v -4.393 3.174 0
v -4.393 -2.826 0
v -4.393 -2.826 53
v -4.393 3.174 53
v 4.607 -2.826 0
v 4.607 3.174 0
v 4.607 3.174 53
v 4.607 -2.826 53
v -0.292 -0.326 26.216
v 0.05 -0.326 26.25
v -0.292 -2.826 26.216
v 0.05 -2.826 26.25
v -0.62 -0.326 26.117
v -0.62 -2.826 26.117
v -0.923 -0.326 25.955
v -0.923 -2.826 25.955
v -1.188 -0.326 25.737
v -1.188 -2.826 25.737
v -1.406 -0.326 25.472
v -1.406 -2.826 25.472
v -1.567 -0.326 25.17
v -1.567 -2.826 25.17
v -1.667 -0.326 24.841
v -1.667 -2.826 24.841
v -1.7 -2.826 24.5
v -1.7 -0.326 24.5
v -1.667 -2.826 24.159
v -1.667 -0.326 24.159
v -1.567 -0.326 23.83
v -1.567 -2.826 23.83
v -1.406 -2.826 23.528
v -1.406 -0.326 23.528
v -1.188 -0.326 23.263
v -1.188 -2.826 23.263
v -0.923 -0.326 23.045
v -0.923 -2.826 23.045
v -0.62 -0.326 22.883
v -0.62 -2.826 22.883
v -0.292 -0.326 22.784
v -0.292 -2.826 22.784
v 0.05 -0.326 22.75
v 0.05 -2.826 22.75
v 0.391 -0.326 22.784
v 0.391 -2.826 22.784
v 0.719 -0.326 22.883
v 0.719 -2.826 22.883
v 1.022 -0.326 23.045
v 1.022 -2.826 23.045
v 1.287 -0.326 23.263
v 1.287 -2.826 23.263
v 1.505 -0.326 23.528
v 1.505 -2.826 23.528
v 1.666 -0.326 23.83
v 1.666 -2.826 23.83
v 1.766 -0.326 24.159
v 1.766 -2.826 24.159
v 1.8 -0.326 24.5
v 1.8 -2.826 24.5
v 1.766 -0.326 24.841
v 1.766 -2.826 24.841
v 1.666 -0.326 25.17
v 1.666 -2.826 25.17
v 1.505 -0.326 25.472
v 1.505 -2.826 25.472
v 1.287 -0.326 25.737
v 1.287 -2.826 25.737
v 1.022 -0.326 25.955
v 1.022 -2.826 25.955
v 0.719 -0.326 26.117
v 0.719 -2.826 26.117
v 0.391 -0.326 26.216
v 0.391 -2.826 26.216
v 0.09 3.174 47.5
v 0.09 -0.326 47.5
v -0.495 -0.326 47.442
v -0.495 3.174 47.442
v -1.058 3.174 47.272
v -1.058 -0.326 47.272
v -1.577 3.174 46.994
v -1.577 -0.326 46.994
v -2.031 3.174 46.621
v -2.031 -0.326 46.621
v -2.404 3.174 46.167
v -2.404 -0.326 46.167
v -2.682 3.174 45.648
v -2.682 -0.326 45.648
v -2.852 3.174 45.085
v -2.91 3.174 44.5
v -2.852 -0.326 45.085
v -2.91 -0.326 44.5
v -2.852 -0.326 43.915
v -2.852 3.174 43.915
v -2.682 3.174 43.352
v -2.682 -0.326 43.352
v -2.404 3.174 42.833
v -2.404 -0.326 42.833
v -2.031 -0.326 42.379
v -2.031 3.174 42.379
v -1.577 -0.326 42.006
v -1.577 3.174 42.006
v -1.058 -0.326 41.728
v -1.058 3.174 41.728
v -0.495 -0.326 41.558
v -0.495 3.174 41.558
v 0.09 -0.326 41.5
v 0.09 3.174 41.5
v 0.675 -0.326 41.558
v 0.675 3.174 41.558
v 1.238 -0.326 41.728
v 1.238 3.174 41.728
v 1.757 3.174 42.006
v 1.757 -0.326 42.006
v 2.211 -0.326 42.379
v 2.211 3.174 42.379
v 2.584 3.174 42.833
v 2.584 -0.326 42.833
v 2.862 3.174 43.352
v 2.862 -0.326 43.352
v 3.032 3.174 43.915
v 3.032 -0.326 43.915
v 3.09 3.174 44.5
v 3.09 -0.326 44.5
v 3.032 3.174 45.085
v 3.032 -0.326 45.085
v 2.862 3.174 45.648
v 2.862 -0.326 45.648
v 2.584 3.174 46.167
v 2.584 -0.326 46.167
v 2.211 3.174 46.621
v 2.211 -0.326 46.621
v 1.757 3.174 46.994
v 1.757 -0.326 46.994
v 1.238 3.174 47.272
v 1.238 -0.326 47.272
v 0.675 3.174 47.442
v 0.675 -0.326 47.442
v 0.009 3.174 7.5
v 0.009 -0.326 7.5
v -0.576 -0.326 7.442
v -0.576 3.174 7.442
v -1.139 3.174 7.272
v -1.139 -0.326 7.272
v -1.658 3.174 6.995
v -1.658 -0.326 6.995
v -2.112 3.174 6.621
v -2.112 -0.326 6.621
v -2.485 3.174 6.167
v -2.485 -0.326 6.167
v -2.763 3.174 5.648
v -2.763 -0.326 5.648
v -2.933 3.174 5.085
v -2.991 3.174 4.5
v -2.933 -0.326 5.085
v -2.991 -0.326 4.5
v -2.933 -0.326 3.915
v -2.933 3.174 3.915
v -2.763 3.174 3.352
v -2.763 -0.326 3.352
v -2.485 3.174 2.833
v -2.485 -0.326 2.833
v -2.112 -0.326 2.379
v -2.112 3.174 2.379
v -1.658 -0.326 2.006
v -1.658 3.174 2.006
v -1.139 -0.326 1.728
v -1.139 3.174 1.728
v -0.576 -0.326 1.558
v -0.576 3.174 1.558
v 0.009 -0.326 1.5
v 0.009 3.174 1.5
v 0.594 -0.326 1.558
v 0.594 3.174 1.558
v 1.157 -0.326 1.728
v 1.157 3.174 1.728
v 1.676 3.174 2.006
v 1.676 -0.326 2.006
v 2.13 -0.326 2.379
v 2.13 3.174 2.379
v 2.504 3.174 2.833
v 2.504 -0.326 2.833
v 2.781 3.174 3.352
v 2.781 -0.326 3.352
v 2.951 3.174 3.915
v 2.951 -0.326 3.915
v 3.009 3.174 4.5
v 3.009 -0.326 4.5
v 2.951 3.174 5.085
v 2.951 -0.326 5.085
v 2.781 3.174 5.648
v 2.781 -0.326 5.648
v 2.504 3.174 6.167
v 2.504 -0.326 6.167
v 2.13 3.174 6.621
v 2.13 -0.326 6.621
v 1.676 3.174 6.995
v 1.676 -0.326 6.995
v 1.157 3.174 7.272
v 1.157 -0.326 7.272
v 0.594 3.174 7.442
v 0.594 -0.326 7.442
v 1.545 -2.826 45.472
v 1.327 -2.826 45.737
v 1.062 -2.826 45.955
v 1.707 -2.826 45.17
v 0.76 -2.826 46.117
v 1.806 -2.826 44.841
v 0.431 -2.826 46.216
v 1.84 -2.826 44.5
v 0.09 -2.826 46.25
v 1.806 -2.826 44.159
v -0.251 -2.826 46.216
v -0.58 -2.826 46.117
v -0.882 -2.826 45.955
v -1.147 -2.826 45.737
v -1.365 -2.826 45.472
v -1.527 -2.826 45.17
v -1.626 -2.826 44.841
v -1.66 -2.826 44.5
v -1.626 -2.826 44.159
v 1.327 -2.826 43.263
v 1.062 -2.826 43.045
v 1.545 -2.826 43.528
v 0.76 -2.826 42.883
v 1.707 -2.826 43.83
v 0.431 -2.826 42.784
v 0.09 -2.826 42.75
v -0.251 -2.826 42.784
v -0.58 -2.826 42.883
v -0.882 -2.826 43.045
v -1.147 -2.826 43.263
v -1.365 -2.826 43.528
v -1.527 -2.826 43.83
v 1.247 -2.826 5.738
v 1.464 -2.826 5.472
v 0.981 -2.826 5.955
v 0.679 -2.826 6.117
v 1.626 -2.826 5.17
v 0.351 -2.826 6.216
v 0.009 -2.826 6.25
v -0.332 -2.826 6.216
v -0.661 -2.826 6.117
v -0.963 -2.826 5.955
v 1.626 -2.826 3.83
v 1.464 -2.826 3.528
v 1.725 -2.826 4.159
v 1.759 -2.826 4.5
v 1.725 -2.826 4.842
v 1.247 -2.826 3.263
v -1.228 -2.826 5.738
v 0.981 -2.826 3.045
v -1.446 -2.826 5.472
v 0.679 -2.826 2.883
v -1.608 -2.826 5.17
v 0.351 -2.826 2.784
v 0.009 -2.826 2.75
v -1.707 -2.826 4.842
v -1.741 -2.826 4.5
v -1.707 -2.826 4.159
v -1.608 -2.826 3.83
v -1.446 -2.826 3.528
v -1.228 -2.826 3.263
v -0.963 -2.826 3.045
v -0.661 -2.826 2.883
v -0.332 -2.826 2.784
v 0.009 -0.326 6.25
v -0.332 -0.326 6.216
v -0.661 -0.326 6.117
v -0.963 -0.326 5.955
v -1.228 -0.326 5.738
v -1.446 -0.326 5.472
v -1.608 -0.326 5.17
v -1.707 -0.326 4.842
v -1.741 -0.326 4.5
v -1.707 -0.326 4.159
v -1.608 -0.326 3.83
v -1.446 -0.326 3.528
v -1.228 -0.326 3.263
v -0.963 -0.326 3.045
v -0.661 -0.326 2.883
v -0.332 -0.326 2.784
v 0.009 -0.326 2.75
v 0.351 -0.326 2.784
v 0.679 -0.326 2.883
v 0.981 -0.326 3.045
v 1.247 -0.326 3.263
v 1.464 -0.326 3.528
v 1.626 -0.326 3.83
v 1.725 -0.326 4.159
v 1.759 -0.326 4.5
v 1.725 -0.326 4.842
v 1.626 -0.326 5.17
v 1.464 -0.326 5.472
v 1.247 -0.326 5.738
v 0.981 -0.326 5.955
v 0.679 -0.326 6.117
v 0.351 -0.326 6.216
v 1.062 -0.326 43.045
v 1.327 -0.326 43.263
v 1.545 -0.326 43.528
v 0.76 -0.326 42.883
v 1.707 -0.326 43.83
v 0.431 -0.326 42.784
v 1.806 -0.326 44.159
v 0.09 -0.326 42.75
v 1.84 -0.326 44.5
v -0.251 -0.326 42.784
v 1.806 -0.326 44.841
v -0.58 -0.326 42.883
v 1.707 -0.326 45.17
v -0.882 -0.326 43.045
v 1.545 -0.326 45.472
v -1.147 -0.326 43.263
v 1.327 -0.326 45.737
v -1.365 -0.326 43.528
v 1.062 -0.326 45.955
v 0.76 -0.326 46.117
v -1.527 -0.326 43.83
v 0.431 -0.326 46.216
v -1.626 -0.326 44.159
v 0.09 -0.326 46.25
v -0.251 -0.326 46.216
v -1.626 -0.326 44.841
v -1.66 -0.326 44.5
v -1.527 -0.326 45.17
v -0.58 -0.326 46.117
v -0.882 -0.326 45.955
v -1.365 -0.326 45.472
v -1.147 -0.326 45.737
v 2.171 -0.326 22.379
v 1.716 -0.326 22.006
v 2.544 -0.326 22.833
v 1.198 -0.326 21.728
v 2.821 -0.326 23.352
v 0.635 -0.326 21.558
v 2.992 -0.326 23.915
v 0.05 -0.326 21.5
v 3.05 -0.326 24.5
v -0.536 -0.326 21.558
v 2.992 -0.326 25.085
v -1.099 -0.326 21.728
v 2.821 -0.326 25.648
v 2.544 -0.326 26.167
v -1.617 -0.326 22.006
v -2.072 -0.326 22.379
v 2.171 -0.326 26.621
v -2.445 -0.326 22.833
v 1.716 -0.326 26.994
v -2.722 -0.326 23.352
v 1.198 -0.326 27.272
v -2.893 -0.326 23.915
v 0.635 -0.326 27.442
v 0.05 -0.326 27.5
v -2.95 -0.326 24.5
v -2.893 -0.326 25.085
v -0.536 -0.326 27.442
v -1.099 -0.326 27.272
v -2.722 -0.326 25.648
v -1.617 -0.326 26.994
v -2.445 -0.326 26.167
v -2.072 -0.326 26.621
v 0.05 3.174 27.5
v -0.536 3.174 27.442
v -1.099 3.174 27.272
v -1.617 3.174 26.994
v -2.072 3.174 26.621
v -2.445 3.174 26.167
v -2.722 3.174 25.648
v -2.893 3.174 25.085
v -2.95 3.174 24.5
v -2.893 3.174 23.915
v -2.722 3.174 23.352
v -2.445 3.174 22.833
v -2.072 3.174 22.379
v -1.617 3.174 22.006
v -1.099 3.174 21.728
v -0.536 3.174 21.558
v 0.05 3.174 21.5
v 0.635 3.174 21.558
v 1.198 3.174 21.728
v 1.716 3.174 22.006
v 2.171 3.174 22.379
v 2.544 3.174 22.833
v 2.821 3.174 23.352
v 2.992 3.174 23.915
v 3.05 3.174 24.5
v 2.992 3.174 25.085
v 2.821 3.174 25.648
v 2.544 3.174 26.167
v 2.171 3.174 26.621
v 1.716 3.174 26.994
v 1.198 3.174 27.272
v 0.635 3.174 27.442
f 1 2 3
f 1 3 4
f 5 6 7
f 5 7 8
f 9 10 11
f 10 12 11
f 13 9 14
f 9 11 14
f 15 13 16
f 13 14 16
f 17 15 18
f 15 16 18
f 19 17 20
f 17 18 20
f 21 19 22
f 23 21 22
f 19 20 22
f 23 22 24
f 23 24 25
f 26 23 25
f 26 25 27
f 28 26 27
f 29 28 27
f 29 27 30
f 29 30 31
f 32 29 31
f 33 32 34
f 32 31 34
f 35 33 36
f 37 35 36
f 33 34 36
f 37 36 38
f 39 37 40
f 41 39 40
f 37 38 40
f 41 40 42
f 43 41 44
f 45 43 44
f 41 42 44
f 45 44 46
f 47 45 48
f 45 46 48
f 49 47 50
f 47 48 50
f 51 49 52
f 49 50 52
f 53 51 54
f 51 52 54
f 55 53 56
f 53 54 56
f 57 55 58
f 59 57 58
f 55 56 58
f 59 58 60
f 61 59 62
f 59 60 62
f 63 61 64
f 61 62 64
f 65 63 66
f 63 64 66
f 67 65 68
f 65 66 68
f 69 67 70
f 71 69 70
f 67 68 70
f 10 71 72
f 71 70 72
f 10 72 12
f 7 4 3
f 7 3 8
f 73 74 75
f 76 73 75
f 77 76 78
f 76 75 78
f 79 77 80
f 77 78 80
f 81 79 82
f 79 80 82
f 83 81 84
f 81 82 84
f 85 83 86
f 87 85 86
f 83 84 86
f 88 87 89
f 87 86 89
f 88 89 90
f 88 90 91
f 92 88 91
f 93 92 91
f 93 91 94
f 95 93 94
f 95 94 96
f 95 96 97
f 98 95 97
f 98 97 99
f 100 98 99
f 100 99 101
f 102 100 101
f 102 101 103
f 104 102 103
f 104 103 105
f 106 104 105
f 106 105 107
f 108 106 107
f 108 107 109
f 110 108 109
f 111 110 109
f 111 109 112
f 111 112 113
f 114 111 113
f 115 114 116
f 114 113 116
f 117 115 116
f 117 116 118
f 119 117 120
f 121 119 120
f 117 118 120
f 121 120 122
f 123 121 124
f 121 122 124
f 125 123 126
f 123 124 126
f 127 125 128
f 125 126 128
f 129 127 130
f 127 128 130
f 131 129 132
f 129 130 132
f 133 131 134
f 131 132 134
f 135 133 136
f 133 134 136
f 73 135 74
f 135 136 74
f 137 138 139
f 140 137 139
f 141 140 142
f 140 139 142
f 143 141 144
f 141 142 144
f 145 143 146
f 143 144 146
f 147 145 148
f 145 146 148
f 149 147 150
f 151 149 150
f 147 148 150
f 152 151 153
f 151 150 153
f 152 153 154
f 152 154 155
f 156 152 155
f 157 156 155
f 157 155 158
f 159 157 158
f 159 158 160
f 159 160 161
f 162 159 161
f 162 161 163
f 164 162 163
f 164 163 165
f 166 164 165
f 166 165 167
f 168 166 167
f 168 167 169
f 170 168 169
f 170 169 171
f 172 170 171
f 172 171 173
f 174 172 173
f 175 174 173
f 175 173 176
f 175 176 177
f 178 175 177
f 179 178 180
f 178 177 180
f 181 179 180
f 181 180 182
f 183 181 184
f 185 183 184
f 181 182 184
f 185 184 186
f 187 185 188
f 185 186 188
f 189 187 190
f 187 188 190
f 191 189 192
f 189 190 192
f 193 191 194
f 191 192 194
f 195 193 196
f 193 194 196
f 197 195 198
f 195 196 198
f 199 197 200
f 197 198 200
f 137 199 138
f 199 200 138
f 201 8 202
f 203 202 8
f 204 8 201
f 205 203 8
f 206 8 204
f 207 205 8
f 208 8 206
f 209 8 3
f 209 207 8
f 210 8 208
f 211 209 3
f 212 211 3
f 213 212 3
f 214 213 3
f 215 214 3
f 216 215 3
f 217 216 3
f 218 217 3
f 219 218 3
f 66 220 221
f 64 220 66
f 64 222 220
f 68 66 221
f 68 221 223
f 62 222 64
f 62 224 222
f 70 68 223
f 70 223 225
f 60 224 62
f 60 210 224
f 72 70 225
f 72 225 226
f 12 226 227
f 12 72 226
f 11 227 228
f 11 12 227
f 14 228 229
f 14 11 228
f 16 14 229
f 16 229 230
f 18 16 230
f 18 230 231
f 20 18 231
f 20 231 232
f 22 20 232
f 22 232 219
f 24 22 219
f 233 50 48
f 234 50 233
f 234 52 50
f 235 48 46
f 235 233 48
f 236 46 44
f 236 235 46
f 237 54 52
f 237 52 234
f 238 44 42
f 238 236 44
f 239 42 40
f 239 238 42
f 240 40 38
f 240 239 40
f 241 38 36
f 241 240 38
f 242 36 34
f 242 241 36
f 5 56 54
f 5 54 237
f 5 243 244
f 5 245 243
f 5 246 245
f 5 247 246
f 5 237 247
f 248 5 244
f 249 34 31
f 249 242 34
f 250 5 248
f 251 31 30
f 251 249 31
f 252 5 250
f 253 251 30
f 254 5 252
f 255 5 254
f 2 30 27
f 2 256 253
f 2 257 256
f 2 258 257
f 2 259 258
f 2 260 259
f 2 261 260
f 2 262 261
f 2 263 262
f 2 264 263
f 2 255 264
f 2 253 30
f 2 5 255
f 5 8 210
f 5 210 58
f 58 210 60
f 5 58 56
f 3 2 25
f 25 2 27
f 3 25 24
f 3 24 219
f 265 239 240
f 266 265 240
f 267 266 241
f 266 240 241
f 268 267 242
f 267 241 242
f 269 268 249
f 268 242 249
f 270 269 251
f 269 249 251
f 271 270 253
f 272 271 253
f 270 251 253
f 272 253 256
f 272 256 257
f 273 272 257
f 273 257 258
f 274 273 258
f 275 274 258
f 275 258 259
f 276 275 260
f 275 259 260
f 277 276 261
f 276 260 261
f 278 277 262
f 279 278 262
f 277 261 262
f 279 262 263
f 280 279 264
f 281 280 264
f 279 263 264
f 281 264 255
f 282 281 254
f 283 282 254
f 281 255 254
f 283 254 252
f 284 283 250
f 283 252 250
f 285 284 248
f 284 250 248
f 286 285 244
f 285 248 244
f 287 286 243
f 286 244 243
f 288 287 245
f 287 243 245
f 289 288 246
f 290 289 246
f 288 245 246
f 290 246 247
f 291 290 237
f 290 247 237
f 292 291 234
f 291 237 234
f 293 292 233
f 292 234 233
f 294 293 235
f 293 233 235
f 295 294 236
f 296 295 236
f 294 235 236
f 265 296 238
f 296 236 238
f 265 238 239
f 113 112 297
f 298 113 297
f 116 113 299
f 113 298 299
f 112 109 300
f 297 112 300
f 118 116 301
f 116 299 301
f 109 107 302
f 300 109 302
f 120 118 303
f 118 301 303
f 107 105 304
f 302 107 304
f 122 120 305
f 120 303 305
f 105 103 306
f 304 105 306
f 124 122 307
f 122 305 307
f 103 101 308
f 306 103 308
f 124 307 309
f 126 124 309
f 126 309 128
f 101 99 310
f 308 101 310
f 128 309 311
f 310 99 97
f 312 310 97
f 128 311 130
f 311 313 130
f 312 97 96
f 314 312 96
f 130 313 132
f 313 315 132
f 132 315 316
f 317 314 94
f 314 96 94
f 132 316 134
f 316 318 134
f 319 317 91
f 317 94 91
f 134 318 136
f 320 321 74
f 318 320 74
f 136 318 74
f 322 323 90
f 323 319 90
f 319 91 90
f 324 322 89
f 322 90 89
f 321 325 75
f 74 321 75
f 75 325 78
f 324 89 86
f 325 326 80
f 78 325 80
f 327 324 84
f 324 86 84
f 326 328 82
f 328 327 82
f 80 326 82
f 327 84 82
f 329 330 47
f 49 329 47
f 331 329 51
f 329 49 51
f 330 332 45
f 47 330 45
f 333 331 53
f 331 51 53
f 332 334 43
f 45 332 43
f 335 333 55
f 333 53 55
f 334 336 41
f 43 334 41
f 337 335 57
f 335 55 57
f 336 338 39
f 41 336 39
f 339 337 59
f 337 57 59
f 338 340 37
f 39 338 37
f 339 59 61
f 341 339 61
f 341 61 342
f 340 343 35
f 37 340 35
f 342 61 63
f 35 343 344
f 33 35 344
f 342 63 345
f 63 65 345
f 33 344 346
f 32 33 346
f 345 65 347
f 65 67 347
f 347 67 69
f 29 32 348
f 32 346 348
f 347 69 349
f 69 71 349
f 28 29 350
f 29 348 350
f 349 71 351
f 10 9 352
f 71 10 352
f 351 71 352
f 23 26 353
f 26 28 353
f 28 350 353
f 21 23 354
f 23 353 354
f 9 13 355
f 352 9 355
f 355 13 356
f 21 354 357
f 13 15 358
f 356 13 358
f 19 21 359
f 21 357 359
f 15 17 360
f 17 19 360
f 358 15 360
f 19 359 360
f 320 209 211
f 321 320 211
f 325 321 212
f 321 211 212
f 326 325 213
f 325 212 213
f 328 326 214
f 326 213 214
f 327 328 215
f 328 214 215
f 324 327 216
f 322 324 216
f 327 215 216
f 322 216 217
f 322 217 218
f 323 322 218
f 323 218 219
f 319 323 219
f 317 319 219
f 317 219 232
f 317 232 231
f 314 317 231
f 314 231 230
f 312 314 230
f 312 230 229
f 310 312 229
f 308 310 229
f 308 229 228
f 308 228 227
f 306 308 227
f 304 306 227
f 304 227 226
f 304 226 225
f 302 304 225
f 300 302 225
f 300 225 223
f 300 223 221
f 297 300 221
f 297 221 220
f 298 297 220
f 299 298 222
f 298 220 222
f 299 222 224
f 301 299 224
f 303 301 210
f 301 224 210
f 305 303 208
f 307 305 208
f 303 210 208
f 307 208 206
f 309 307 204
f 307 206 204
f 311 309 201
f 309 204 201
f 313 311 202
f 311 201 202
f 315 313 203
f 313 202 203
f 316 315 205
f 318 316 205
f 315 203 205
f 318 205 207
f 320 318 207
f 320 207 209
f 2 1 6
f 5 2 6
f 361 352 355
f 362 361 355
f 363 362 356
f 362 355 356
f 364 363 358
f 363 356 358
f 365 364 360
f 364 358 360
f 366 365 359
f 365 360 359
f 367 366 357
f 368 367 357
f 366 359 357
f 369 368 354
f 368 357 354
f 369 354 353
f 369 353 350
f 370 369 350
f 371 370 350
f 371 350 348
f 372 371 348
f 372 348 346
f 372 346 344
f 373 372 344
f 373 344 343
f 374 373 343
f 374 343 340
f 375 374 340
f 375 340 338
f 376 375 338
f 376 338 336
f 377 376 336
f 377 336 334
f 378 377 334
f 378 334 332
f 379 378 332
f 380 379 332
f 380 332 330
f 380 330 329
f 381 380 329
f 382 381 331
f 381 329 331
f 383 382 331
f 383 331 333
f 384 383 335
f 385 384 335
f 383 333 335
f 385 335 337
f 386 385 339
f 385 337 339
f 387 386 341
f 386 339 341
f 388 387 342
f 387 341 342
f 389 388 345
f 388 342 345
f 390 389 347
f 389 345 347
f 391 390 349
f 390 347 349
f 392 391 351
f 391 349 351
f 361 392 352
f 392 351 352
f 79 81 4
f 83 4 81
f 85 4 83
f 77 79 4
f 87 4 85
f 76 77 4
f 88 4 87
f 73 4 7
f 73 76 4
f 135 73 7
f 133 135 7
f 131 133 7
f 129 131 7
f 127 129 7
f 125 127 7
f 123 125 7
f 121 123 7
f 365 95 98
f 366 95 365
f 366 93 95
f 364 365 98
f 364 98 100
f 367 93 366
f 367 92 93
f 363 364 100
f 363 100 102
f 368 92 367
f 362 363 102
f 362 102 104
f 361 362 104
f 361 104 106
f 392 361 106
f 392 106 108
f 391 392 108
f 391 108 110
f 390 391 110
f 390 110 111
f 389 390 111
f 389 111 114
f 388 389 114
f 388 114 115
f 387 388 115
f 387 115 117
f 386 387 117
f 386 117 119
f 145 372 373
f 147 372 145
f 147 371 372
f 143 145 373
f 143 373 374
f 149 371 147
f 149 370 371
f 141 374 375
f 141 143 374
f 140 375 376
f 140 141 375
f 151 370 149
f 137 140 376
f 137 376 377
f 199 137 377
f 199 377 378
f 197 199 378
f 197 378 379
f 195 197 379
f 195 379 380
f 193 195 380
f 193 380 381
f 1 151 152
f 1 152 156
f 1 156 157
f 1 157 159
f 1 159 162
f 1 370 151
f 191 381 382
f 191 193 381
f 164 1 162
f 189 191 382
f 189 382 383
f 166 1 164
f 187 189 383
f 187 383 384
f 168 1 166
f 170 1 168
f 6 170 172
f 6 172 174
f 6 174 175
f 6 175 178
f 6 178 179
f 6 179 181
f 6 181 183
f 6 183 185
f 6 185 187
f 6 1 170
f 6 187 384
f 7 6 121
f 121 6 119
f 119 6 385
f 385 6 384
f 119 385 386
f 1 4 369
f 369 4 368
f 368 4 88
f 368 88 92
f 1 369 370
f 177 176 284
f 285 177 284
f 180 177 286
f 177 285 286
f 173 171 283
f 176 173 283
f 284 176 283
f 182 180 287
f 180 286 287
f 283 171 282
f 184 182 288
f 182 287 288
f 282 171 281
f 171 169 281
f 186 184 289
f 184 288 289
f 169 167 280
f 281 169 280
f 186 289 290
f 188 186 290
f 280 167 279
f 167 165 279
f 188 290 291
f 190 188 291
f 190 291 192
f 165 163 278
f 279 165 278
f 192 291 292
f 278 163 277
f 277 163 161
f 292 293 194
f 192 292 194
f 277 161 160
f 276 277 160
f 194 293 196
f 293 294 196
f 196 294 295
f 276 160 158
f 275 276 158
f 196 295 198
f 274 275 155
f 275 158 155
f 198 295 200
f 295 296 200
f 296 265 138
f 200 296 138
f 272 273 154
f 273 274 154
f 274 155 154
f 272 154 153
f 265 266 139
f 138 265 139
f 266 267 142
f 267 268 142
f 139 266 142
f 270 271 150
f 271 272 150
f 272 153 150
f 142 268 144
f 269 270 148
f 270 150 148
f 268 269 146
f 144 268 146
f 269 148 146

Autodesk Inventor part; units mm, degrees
ref_plane "YZ Plane" through (0, 0, 0) normal (1, 0, 0) x (0, 1, 0)
ref_plane "XZ Plane" through (0, 0, 0) normal (0, 1, 0) x (-1, 0, 0)
ref_plane "XY Plane" through (0, 0, 0) normal (0, 0, 1) x (1, 0, 0)
sketch "Sketch1" plane through (0, 0, 0) normal (0, 0, 1) x (1, 0, 0)
  line L0 (4.6071, -2.8259) -> (-4.3929, -2.8259)
  line L1 (-4.3929, -2.8259) -> (-4.3929, 3.1741)
  line L2 (-4.3929, 3.1741) -> (4.6071, 3.1741)
  line L3 (4.6071, 3.1741) -> (4.6071, -2.8259)
  point P0 (0, 0)
  dimension "d0" = 9
  dimension "d1" = 6
extrude "Extrusion1" add sketch "Sketch1" along normal blind 53
sketch "Sketch2" plane through (-4.3929, 3.1741, 0) normal (0, 1, 0) x (1, 0, 0)
  line L0 (0, 0) -> (9, 0) projected
  line L1 (0, 0) -> (0, -53) projected
  line L2 (9, -53) -> (0, -53) projected
  line L3 (9, 0) -> (9, -53) projected
  line L4 (-2.9143, -24.5) -> (15.4572, -24.5)
  line L5 (4.5, -53) -> (4.3929, 0)
  circle A0 centre (4.4828, -44.5) radius 1.75
  circle A1 centre (4.4424, -24.5) radius 1.75
  circle A2 centre (4.402, -4.5001) radius 1.75
  dimension "d4" = 3.5
  dimension "d5" = 40
  dimension "d6" = 8.5
  dimension "d9" = 20
hole "Hole1" at (0.09, 3.1741, 44.5) at (0.0495, 3.1741, 24.5) at (0.0091, 3.1741, 4.5001) direction (0, -1, 0) diameter 3.5 end through all counterbore diameter 6 counterbore depth 3.5
properties part number "slider-rail"
